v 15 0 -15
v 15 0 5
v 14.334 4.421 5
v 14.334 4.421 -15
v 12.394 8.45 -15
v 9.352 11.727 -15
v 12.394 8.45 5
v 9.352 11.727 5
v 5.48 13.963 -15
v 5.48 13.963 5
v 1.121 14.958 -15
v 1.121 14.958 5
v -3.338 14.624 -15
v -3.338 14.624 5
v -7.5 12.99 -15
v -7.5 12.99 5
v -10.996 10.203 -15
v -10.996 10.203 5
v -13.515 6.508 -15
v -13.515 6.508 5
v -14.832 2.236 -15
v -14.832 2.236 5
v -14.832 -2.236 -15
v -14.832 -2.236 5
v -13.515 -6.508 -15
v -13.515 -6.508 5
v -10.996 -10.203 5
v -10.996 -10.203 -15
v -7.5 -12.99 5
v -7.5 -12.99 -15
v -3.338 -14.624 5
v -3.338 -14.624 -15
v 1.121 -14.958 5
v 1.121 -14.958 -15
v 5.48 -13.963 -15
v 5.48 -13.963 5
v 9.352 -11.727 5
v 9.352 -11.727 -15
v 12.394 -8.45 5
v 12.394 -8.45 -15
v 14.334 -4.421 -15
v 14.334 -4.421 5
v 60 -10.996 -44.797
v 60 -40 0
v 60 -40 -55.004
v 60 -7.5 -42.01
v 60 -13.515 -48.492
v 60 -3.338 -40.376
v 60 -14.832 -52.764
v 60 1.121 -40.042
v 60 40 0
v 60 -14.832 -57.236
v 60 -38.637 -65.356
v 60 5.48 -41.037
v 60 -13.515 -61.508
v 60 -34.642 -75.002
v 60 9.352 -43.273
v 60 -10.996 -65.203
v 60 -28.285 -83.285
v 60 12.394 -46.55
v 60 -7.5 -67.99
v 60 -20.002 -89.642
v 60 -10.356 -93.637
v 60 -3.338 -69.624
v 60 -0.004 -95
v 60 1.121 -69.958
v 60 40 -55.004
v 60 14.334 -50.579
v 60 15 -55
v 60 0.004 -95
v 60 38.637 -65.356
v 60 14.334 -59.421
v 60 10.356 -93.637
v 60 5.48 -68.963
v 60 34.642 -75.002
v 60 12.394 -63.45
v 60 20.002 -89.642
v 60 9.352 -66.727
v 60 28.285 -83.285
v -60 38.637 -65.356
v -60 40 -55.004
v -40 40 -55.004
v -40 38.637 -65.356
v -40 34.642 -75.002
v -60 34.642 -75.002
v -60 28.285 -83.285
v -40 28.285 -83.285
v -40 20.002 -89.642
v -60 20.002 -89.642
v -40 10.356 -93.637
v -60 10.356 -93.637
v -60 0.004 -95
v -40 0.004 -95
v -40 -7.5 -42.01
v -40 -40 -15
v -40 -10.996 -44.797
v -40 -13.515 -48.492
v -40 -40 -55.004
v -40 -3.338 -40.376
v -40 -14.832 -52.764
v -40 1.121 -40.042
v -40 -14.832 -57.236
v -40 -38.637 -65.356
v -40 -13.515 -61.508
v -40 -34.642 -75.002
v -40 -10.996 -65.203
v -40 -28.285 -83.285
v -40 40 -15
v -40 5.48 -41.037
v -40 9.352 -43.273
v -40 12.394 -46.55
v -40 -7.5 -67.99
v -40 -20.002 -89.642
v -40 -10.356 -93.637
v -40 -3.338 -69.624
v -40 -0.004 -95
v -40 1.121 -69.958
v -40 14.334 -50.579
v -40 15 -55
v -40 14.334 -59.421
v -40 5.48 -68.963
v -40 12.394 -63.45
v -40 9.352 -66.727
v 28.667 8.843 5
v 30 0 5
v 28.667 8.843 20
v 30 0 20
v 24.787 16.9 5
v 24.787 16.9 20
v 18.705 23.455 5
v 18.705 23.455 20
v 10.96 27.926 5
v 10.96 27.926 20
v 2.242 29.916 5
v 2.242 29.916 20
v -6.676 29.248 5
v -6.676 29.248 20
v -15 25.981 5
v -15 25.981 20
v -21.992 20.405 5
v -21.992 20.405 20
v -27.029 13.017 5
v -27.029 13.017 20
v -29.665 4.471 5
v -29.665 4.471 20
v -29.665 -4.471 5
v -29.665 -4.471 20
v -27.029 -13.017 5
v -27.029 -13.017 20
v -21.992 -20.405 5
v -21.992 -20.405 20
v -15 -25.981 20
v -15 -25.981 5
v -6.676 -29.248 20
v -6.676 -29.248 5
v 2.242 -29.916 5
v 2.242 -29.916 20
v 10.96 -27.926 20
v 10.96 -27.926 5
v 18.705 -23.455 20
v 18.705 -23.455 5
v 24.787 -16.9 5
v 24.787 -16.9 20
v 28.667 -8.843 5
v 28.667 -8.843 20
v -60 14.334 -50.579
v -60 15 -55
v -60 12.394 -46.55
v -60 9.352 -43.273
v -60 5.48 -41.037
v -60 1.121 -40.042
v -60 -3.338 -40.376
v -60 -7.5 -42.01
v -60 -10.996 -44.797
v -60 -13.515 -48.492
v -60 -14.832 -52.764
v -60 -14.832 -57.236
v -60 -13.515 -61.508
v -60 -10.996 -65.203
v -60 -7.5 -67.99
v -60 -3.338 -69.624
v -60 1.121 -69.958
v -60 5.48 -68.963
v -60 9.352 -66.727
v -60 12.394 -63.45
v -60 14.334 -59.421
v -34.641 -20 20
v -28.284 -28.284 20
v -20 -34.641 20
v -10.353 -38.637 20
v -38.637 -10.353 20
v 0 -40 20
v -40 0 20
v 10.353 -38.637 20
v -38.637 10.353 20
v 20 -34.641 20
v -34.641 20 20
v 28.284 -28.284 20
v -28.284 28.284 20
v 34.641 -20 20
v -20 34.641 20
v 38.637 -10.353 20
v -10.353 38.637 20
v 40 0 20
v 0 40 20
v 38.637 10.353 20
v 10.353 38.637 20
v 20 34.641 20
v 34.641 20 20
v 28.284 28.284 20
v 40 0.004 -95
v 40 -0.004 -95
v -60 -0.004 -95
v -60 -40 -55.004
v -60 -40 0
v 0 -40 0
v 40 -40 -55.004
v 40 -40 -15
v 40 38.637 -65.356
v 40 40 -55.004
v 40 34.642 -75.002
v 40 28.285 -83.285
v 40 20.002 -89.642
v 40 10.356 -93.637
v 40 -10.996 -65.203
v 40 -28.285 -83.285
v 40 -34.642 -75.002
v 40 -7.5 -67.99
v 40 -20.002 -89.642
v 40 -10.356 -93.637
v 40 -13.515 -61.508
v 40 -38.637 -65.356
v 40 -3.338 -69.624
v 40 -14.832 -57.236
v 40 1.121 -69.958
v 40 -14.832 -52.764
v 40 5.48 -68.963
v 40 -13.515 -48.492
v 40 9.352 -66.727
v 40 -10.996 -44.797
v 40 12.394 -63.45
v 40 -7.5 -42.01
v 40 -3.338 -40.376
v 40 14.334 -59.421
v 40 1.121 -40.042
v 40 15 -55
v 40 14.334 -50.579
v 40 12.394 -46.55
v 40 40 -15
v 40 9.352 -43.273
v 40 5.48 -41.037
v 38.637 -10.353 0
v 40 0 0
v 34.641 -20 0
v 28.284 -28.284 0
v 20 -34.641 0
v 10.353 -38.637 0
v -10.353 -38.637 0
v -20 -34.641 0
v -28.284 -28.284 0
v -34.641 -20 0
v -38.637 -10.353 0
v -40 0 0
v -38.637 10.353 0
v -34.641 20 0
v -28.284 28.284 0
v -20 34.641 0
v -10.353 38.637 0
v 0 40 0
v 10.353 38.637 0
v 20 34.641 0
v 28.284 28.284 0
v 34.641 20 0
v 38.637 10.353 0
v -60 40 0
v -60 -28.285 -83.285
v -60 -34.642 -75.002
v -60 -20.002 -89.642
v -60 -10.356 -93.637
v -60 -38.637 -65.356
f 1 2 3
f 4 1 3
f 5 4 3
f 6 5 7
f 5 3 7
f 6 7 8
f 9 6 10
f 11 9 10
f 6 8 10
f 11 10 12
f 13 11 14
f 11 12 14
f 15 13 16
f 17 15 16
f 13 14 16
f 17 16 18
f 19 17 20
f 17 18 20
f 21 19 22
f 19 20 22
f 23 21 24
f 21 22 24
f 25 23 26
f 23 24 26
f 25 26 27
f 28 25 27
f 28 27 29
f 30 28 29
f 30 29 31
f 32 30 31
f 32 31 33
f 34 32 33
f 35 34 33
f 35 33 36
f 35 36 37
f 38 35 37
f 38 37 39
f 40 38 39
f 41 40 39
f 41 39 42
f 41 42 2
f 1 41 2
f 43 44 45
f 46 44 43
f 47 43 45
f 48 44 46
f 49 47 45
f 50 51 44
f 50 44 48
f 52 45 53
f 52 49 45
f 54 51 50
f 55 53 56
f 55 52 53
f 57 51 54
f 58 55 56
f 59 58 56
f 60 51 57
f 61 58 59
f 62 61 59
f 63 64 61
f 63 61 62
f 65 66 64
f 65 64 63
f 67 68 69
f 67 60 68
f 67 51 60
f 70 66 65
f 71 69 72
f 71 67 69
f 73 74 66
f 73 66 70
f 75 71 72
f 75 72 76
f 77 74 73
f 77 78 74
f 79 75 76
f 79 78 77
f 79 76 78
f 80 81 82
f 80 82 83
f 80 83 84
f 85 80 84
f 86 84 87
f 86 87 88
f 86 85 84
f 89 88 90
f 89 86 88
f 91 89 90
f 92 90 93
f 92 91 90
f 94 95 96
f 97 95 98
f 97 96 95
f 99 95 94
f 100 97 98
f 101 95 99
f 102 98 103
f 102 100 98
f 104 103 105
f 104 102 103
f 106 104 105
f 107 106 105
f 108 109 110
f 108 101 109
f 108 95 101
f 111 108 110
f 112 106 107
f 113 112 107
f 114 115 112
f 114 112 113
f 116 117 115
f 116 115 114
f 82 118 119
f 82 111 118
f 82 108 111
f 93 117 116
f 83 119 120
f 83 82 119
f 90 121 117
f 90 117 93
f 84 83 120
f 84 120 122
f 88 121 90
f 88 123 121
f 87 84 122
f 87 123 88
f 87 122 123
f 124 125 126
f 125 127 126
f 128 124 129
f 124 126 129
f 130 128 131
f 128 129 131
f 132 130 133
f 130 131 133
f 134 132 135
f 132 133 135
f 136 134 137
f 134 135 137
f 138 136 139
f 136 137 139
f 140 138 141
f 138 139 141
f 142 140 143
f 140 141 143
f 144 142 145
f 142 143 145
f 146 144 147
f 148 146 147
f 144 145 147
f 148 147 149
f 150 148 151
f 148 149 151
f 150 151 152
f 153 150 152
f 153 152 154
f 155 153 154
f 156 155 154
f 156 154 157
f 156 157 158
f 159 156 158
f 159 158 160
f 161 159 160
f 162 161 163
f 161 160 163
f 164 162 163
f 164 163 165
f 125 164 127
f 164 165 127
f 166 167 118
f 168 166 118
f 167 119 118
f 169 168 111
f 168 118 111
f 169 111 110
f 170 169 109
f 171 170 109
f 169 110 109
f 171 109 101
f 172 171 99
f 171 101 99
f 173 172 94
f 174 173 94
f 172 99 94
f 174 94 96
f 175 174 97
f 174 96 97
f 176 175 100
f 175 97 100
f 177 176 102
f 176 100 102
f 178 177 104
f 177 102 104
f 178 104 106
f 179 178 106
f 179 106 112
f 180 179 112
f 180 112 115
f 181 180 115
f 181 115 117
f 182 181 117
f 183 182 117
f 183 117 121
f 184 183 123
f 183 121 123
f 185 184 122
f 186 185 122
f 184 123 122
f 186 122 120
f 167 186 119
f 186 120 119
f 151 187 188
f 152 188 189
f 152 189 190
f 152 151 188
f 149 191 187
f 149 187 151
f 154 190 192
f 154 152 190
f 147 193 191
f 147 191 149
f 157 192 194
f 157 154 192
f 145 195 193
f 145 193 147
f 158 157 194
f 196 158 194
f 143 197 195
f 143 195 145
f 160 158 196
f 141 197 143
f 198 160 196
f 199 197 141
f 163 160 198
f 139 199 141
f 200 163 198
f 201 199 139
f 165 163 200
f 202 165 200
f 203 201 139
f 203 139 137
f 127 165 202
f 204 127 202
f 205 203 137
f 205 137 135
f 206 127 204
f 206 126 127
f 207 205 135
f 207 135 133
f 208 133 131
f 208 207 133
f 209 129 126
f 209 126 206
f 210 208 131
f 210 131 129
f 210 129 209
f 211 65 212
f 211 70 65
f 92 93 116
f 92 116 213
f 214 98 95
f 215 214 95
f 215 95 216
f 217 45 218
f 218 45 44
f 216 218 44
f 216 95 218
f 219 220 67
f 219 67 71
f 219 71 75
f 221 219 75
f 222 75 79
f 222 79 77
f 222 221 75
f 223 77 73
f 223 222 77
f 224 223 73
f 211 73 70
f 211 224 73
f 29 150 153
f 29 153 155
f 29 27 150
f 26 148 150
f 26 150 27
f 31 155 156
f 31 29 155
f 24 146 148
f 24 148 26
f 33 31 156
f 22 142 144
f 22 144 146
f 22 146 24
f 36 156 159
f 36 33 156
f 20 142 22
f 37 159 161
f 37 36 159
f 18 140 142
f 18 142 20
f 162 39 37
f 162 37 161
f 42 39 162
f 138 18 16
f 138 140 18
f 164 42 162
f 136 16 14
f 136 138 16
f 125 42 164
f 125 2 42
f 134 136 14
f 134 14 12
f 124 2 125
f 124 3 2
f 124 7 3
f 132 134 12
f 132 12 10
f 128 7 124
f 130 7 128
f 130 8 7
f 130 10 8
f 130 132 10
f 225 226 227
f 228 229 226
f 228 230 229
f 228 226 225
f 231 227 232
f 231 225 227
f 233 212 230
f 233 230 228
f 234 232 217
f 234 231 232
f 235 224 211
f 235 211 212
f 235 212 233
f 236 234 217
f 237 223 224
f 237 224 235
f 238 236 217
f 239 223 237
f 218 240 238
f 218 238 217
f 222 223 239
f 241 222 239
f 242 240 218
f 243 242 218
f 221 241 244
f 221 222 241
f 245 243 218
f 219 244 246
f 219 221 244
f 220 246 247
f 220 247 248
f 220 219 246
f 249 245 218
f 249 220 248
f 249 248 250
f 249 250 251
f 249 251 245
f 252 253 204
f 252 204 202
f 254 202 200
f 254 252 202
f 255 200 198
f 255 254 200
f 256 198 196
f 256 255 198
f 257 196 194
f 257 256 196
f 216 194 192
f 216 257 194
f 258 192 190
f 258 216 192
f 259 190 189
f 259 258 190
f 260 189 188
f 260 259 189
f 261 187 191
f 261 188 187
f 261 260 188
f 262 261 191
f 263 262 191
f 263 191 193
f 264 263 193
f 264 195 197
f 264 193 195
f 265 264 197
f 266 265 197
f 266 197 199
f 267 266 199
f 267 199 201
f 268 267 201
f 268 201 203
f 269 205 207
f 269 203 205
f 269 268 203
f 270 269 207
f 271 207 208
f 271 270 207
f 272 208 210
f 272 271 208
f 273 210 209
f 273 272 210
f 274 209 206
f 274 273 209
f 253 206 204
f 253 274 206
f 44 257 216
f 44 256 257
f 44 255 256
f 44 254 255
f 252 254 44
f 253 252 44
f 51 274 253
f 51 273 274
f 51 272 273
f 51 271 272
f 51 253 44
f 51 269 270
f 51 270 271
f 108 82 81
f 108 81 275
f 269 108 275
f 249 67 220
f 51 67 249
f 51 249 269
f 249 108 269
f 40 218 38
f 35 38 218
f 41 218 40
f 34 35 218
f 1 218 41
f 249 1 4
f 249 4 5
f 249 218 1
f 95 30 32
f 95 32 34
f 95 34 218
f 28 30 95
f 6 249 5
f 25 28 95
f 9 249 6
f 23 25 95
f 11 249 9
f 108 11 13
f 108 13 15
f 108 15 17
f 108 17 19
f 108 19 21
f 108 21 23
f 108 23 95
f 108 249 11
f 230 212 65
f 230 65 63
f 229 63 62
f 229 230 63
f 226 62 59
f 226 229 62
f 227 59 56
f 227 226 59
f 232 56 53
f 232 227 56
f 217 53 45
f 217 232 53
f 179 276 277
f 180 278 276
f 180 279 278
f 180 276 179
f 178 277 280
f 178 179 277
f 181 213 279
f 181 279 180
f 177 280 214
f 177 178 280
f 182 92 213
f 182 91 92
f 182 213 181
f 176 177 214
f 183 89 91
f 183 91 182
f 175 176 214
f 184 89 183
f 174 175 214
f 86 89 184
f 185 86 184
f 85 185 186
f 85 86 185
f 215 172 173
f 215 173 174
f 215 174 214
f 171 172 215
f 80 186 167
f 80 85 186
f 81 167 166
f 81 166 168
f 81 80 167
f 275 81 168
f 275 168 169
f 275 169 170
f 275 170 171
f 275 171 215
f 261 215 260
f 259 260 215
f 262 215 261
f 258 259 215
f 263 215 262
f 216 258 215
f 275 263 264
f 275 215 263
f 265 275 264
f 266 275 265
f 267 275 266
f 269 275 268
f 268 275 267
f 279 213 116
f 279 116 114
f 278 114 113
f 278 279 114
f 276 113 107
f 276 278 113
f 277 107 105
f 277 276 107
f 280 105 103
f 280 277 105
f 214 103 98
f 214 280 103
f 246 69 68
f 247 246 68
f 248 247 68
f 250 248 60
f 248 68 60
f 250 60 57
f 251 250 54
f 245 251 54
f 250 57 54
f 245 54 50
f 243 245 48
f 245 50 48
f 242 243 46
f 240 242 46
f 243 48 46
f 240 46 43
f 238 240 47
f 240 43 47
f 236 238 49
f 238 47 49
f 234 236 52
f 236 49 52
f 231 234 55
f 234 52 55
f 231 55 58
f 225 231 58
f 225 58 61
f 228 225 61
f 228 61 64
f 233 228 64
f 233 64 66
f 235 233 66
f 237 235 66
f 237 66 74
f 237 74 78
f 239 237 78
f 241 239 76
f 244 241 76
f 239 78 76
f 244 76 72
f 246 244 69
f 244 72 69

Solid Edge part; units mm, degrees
sketch "Sketch1" plane through (0, 0, 0) normal (0, -1, 0) x (1, 0, 0)
  line L0 (0, 0) -> (60, 0)
  line L1 (60, 0) -> (60, -95)
  line L2 (60, -95) -> (40, -95)
  line L3 (40, -95) -> (40, -15)
  line L4 (40, -15) -> (-40, -15)
  line L5 (-40, -15) -> (-40, -95)
  line L6 (-40, -95) -> (-60, -95)
  line L7 (-60, -95) -> (-60, 0)
  line L8 (-60, 0) -> (0, 0)
extrude "Protrusion1" add sketch "Sketch1" along normal mid plane 80
sketch "Sketch2" plane through (60, 0, -47.5) normal (1, 0, 0) x (0, 1, 0)
  circle A0 centre (0, -7.5) radius 15
extrude "ExtrudedCutout_1" cut sketch "Sketch2" against normal blind 120
fillet "Round_3" radius 40 4 edges at (50, -40, -95) (50, 40, -95) (-50, 40, -95) (-50, -40, -95)
sketch "Sketch3" plane through (0, 0, 0) normal (0, 0, 1) x (1, 0, 0)
  circle A0 centre (0, 0) radius 40
extrude "ExtrudedProtrusion_3" add sketch "Sketch3" along normal blind 20
sketch "Sketch4" plane through (0, 0, 20) normal (0, 0, 1) x (1, 0, 0)
  circle A0 centre (0, 0) radius 30
extrude "ExtrudedCutout_3" cut sketch "Sketch4" against normal blind 15
sketch "Sketch5" plane through (0, 0, 5) normal (0, 0, 1) x (1, 0, 0)
  circle A0 centre (0, 0) radius 15
extrude "ExtrudedCutout_4" cut sketch "Sketch5" against normal blind 20
